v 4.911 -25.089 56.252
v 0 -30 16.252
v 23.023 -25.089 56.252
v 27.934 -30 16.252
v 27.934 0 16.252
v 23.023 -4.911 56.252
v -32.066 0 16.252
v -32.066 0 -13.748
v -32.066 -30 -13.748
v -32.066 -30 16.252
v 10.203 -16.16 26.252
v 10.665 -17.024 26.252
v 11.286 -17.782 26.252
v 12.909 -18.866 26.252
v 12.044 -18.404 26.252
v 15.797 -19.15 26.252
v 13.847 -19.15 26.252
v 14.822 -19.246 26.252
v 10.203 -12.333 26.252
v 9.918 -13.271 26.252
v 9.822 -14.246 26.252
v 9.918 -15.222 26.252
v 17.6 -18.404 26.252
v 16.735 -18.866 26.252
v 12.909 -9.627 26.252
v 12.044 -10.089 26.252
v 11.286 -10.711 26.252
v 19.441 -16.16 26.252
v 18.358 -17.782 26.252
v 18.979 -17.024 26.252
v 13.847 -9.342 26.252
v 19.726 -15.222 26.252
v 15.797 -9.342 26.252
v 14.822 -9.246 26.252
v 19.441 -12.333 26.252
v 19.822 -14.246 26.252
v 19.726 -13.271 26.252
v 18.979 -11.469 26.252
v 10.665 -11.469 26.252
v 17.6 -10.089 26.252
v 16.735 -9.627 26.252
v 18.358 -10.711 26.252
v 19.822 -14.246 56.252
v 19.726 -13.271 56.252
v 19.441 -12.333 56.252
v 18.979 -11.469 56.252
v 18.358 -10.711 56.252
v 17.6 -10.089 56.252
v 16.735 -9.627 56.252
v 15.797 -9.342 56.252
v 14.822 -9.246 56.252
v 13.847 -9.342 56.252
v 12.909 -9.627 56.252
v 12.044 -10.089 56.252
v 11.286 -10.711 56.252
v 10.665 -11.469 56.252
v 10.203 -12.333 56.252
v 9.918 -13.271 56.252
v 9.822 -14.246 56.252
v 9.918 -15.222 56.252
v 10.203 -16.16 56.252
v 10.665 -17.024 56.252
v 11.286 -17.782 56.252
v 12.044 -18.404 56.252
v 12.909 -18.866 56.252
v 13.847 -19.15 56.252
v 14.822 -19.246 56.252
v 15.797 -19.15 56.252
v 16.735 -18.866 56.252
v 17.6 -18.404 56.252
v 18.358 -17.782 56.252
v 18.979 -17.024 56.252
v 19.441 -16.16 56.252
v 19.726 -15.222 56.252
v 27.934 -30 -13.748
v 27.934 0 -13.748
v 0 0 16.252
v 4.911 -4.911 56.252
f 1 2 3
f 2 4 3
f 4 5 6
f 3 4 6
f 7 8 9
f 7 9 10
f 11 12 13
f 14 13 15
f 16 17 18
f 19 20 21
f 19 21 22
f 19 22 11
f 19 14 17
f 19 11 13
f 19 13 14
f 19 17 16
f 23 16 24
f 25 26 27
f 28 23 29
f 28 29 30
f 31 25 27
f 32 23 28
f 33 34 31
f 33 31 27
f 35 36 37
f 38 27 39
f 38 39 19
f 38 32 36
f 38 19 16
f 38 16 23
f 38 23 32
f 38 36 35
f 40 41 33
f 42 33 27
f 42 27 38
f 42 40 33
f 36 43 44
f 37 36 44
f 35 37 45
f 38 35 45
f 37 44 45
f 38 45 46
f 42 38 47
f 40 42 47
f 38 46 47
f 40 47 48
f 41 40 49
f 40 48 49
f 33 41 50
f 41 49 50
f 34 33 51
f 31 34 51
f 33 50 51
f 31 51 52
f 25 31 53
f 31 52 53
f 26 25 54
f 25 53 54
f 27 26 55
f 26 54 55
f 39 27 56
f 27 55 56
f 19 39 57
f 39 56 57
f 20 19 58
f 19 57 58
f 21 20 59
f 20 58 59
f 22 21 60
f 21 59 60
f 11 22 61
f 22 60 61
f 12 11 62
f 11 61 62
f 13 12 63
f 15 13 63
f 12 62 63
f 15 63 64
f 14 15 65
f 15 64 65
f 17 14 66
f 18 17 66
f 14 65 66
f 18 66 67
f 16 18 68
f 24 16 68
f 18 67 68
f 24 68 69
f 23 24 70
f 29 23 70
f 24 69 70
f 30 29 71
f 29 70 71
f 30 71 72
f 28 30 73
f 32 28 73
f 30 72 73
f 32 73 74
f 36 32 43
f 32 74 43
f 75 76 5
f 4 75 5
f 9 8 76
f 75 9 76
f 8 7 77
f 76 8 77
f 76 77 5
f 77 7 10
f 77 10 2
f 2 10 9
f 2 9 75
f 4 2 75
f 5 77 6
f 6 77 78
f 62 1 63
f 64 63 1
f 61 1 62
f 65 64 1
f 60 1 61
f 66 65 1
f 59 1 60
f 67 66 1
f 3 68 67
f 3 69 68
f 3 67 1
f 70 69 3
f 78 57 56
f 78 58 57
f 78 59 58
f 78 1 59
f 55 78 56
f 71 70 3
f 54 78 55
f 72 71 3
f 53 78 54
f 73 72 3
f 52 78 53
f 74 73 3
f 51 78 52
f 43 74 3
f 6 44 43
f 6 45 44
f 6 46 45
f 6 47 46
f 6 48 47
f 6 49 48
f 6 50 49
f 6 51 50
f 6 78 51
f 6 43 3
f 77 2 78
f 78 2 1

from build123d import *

# Parameters (mm, degrees)
F0_W     = 60
F0_H     = 30
F1_DEPTH = 30
F2_W     = 27.9342501611
F2_H     = 30
F3_DEPTH = 40
F3_TAPER = 7
F4_R     = 5
F5_DEPTH = 30


with BuildPart() as f1:
    # F0 (on Front) → F1 (new body)
    with BuildSketch(Plane.XZ):
        with Locations((-2.0657498389, 1.2521591907)):
            Rectangle(F0_W, F0_H)
    extrude(amount=F1_DEPTH)

    # F2 (on face) → F3 (join)
    with BuildSketch(Plane.XY.offset(16.2521591907)):
        with Locations((13.9671250805, -15)):
            Rectangle(F2_W, F2_H)
    extrude(amount=F3_DEPTH, taper=F3_TAPER)

    # F4 (on face) → F5 (cut)
    with BuildSketch(Plane.XY.offset(56.2521591907)):
        with Locations((14.8219978437, -14.2463846132)):
            Circle(F4_R)
    extrude(amount=-F5_DEPTH, mode=Mode.SUBTRACT)


solid = f1.part
